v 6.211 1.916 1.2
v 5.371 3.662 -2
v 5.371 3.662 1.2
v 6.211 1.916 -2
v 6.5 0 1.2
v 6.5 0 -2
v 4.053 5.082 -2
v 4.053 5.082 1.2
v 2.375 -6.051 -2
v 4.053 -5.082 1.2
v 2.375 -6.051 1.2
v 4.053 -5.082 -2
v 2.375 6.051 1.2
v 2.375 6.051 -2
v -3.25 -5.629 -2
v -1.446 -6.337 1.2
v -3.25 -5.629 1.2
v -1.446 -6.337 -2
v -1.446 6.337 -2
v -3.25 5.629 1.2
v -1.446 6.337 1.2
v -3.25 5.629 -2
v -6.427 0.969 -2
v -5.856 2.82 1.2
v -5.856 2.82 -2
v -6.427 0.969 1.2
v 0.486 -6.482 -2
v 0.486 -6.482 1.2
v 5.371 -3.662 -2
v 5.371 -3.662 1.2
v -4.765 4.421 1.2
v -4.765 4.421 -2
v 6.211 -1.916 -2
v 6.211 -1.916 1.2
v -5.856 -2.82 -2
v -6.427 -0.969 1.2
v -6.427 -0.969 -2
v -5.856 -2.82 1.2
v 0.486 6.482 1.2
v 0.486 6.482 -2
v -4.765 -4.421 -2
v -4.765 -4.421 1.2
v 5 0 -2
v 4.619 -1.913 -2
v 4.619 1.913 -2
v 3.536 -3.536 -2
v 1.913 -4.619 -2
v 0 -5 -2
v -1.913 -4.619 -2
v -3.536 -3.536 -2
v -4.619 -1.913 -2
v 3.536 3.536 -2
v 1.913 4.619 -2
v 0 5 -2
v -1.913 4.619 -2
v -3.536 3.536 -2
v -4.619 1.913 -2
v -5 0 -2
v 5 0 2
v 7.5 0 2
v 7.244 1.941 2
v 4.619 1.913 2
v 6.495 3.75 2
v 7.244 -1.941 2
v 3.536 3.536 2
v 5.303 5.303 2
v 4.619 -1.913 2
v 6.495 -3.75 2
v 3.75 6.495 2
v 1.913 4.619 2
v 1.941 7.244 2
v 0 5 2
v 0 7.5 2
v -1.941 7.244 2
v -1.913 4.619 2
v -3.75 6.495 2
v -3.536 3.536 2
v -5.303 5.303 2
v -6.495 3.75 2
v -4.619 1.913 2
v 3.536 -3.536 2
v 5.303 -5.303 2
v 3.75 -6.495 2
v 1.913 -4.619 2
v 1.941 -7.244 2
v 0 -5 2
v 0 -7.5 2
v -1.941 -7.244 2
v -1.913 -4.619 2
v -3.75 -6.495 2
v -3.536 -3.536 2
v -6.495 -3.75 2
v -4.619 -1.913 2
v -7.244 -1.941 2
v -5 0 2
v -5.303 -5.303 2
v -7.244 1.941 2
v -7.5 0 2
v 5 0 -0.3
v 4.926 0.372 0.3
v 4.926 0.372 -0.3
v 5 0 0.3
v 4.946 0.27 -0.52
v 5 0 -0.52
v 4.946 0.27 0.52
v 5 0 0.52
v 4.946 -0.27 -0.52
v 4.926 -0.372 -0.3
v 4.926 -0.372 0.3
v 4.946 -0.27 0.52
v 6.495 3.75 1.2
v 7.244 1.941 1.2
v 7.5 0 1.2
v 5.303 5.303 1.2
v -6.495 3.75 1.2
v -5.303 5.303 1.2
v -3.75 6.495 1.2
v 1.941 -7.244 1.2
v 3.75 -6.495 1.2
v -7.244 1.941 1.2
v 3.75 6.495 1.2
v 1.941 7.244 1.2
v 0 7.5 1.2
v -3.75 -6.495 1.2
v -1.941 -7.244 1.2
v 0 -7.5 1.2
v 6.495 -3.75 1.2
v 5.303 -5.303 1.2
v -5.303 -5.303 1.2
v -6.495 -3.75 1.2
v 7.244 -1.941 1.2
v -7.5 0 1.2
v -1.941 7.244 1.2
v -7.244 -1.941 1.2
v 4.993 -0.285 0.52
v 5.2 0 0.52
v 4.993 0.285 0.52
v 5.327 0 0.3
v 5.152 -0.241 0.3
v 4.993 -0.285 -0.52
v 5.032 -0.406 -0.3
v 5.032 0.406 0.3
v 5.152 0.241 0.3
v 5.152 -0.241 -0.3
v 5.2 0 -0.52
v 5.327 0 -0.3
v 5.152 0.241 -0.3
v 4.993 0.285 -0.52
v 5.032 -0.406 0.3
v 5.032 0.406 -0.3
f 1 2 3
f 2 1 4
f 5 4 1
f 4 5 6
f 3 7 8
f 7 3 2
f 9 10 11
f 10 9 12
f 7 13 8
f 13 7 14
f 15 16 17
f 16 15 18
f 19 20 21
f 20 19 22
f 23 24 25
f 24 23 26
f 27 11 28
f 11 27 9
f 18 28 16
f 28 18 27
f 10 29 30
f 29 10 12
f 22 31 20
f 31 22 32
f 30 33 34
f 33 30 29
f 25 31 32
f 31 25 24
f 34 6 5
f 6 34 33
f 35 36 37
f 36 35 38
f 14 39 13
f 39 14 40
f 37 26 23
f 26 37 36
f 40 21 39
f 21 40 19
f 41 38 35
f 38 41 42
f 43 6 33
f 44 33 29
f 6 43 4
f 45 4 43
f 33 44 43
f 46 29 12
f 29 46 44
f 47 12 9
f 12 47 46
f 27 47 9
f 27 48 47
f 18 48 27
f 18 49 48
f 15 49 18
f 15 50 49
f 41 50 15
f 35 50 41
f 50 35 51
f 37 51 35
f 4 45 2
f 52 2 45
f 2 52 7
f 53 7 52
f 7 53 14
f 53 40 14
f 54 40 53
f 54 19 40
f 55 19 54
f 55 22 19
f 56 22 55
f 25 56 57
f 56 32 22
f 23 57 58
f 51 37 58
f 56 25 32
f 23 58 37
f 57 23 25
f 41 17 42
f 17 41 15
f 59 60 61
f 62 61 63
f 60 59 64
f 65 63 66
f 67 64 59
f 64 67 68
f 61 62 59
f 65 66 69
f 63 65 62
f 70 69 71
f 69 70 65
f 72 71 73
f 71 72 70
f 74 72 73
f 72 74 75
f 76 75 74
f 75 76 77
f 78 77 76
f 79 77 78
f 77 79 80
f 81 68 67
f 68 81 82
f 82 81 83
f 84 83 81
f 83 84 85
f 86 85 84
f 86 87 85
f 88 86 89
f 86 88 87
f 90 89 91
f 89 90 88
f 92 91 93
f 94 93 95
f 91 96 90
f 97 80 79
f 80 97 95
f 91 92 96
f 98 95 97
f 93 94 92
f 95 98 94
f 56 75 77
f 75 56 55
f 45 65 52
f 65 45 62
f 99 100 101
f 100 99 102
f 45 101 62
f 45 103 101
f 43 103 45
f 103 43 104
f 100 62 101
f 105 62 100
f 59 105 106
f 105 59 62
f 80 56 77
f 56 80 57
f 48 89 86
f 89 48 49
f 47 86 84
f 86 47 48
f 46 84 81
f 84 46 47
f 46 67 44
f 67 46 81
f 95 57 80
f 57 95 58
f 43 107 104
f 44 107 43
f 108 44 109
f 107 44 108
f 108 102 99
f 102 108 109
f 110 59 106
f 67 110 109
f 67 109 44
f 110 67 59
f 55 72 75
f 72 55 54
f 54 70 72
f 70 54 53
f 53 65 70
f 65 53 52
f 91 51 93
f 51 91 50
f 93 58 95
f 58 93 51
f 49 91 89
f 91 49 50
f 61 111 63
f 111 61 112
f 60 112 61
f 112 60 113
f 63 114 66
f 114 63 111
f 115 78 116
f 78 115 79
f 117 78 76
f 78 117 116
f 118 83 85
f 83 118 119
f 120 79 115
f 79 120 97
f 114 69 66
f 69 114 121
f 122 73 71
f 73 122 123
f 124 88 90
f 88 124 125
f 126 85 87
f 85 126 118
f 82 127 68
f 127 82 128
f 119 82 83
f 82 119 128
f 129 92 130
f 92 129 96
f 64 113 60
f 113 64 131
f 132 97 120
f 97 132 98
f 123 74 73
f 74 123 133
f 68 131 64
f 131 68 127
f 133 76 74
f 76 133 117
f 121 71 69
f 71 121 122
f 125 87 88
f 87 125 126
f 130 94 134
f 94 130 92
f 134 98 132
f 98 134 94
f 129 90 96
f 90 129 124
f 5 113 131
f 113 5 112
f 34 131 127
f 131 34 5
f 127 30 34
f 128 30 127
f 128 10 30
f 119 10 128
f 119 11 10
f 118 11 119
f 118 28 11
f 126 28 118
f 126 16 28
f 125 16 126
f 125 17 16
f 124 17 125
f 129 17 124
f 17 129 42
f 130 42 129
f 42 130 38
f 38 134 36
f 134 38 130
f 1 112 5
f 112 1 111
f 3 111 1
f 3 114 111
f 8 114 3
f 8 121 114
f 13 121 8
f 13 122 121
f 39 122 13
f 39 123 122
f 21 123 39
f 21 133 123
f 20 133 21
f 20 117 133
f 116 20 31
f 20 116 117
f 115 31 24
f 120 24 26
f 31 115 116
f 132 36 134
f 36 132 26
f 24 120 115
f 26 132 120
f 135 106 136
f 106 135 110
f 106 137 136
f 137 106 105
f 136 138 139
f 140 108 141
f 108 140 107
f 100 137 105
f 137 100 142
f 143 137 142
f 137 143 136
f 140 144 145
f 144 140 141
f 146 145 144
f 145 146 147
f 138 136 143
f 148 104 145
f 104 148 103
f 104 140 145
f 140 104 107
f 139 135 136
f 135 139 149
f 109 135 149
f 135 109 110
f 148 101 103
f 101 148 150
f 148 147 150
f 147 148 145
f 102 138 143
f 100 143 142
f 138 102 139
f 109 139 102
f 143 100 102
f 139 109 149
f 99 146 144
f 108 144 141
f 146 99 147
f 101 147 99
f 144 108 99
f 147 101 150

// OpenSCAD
// Parameters
bore_d = 5.0; //[2.5:10.0:0.1]
outer_d = 13.0; //[6.5:26.0:0.1]
width = 4.0; //[2.0:8.0:0.1]
flange_d = 15.0; //[7.5:30.0:0.1]
flange_thk = 0.8; //[0.4:1.6:0.05]
inner_ring_od = 8.0; //[6.0:12.0:0.1]
outer_ring_id = 10.0; //[8.5:12.5:0.1]
radial_clearance = 0.1; //[0.05:0.3:0.01]
seal_thk = 0.3; //[0.15:0.8:0.05]
groove_depth = 0.4; //[0.2:0.8:0.05]
groove_radius = 0.6; //[0.3:1.2:0.05]
overlap = 0.6; //[0.2:1.5:0.05]
ball_d = 1.2; //[0.6:2.4:0.05]
num_balls = 8; //[5:12:1]
cage_thk = 0.6; //[0.3:1.2:0.05]
cage_radial_thk = 0.5; //[0.2:1.2:0.05]

// Base Shapes
module outer_ring_outer_cyl() {
  cylinder(r=outer_d/2, h=width, center=true);
}

module outer_ring_inner_bore_cyl() {
  cylinder(r=outer_ring_id/2, h=width + 2*overlap, center=true);
}

module flange_cyl() {
  translate([0, 0, width/2 - flange_thk/2])
    cylinder(r=flange_d/2, h=flange_thk, center=true);
}

module inner_ring_outer_cyl() {
  cylinder(r=inner_ring_od/2, h=width, center=true);
}

module inner_ring_bore_cyl() {
  cylinder(r=bore_d/2, h=width + 2*overlap, center=true);
}

module outer_groove_cutter_sphere() {
  translate([(outer_ring_id/2 + inner_ring_od/2)/2, 0, 0])
    sphere(r=groove_radius);
}

module inner_groove_cutter_sphere() {
  translate([(outer_ring_id/2 + inner_ring_od/2)/2, 0, 0])
    sphere(r=groove_radius);
}

module shield_left_cyl() {
  translate([0, 0, -width/2 + seal_thk/2])
    cylinder(r=outer_ring_id/2 - radial_clearance, h=seal_thk, center=true);
}

module shield_right_cyl() {
  translate([0, 0, width/2 - seal_thk/2])
    cylinder(r=outer_ring_id/2 - radial_clearance, h=seal_thk, center=true);
}

module cage_ring_outer_cyl() {
  cylinder(r=(outer_ring_id/2 + inner_ring_od/2)/2 + ball_d/2 + cage_radial_thk, h=cage_thk, center=true);
}

module cage_ring_inner_cyl() {
  cylinder(r=(outer_ring_id/2 + inner_ring_od/2)/2 - ball_d/2 - cage_radial_thk, h=cage_thk + 2*overlap, center=true);
}

module ball(pos) {
  translate(pos)
    sphere(r=ball_d/2);
}

// Operations
module outer_ring_shell() {
  difference() {
    outer_ring_outer_cyl();
    outer_ring_inner_bore_cyl();
  }
}

module outer_ring_with_flange() {
  union() {
    outer_ring_shell();
    flange_cyl();
  }
}

module inner_ring_shell() {
  difference() {
    inner_ring_outer_cyl();
    inner_ring_bore_cyl();
  }
}

module outer_ring_with_groove() {
  difference() {
    outer_ring_with_flange();
    translate([groove_depth, 0, 0]) outer_groove_cutter_sphere();
  }
}

module inner_ring_with_groove() {
  difference() {
    inner_ring_shell();
    translate([-groove_depth, 0, 0]) inner_groove_cutter_sphere();
  }
}

module cage_ring() {
  difference() {
    cage_ring_outer_cyl();
    cage_ring_inner_cyl();
  }
}

module balls_union() {
  union() {
    for (i = [0:num_balls-1]) {
      ball([(outer_ring_id/2 + inner_ring_od/2)/2 * cos(360/num_balls*i),
            (outer_ring_id/2 + inner_ring_od/2)/2 * sin(360/num_balls*i),
            0]);
    }
  }
}

module bearing_assembly_union() {
  union() {
    outer_ring_with_groove();
    inner_ring_with_groove();
    shield_left_cyl();
    shield_right_cyl();
    cage_ring();
    balls_union();
  }
}

module bearing_voids_clearances() {
  difference() {
    bearing_assembly_union();
    outer_ring_inner_bore_cyl();
  }
}

// Final Output
bearing_voids_clearances();
